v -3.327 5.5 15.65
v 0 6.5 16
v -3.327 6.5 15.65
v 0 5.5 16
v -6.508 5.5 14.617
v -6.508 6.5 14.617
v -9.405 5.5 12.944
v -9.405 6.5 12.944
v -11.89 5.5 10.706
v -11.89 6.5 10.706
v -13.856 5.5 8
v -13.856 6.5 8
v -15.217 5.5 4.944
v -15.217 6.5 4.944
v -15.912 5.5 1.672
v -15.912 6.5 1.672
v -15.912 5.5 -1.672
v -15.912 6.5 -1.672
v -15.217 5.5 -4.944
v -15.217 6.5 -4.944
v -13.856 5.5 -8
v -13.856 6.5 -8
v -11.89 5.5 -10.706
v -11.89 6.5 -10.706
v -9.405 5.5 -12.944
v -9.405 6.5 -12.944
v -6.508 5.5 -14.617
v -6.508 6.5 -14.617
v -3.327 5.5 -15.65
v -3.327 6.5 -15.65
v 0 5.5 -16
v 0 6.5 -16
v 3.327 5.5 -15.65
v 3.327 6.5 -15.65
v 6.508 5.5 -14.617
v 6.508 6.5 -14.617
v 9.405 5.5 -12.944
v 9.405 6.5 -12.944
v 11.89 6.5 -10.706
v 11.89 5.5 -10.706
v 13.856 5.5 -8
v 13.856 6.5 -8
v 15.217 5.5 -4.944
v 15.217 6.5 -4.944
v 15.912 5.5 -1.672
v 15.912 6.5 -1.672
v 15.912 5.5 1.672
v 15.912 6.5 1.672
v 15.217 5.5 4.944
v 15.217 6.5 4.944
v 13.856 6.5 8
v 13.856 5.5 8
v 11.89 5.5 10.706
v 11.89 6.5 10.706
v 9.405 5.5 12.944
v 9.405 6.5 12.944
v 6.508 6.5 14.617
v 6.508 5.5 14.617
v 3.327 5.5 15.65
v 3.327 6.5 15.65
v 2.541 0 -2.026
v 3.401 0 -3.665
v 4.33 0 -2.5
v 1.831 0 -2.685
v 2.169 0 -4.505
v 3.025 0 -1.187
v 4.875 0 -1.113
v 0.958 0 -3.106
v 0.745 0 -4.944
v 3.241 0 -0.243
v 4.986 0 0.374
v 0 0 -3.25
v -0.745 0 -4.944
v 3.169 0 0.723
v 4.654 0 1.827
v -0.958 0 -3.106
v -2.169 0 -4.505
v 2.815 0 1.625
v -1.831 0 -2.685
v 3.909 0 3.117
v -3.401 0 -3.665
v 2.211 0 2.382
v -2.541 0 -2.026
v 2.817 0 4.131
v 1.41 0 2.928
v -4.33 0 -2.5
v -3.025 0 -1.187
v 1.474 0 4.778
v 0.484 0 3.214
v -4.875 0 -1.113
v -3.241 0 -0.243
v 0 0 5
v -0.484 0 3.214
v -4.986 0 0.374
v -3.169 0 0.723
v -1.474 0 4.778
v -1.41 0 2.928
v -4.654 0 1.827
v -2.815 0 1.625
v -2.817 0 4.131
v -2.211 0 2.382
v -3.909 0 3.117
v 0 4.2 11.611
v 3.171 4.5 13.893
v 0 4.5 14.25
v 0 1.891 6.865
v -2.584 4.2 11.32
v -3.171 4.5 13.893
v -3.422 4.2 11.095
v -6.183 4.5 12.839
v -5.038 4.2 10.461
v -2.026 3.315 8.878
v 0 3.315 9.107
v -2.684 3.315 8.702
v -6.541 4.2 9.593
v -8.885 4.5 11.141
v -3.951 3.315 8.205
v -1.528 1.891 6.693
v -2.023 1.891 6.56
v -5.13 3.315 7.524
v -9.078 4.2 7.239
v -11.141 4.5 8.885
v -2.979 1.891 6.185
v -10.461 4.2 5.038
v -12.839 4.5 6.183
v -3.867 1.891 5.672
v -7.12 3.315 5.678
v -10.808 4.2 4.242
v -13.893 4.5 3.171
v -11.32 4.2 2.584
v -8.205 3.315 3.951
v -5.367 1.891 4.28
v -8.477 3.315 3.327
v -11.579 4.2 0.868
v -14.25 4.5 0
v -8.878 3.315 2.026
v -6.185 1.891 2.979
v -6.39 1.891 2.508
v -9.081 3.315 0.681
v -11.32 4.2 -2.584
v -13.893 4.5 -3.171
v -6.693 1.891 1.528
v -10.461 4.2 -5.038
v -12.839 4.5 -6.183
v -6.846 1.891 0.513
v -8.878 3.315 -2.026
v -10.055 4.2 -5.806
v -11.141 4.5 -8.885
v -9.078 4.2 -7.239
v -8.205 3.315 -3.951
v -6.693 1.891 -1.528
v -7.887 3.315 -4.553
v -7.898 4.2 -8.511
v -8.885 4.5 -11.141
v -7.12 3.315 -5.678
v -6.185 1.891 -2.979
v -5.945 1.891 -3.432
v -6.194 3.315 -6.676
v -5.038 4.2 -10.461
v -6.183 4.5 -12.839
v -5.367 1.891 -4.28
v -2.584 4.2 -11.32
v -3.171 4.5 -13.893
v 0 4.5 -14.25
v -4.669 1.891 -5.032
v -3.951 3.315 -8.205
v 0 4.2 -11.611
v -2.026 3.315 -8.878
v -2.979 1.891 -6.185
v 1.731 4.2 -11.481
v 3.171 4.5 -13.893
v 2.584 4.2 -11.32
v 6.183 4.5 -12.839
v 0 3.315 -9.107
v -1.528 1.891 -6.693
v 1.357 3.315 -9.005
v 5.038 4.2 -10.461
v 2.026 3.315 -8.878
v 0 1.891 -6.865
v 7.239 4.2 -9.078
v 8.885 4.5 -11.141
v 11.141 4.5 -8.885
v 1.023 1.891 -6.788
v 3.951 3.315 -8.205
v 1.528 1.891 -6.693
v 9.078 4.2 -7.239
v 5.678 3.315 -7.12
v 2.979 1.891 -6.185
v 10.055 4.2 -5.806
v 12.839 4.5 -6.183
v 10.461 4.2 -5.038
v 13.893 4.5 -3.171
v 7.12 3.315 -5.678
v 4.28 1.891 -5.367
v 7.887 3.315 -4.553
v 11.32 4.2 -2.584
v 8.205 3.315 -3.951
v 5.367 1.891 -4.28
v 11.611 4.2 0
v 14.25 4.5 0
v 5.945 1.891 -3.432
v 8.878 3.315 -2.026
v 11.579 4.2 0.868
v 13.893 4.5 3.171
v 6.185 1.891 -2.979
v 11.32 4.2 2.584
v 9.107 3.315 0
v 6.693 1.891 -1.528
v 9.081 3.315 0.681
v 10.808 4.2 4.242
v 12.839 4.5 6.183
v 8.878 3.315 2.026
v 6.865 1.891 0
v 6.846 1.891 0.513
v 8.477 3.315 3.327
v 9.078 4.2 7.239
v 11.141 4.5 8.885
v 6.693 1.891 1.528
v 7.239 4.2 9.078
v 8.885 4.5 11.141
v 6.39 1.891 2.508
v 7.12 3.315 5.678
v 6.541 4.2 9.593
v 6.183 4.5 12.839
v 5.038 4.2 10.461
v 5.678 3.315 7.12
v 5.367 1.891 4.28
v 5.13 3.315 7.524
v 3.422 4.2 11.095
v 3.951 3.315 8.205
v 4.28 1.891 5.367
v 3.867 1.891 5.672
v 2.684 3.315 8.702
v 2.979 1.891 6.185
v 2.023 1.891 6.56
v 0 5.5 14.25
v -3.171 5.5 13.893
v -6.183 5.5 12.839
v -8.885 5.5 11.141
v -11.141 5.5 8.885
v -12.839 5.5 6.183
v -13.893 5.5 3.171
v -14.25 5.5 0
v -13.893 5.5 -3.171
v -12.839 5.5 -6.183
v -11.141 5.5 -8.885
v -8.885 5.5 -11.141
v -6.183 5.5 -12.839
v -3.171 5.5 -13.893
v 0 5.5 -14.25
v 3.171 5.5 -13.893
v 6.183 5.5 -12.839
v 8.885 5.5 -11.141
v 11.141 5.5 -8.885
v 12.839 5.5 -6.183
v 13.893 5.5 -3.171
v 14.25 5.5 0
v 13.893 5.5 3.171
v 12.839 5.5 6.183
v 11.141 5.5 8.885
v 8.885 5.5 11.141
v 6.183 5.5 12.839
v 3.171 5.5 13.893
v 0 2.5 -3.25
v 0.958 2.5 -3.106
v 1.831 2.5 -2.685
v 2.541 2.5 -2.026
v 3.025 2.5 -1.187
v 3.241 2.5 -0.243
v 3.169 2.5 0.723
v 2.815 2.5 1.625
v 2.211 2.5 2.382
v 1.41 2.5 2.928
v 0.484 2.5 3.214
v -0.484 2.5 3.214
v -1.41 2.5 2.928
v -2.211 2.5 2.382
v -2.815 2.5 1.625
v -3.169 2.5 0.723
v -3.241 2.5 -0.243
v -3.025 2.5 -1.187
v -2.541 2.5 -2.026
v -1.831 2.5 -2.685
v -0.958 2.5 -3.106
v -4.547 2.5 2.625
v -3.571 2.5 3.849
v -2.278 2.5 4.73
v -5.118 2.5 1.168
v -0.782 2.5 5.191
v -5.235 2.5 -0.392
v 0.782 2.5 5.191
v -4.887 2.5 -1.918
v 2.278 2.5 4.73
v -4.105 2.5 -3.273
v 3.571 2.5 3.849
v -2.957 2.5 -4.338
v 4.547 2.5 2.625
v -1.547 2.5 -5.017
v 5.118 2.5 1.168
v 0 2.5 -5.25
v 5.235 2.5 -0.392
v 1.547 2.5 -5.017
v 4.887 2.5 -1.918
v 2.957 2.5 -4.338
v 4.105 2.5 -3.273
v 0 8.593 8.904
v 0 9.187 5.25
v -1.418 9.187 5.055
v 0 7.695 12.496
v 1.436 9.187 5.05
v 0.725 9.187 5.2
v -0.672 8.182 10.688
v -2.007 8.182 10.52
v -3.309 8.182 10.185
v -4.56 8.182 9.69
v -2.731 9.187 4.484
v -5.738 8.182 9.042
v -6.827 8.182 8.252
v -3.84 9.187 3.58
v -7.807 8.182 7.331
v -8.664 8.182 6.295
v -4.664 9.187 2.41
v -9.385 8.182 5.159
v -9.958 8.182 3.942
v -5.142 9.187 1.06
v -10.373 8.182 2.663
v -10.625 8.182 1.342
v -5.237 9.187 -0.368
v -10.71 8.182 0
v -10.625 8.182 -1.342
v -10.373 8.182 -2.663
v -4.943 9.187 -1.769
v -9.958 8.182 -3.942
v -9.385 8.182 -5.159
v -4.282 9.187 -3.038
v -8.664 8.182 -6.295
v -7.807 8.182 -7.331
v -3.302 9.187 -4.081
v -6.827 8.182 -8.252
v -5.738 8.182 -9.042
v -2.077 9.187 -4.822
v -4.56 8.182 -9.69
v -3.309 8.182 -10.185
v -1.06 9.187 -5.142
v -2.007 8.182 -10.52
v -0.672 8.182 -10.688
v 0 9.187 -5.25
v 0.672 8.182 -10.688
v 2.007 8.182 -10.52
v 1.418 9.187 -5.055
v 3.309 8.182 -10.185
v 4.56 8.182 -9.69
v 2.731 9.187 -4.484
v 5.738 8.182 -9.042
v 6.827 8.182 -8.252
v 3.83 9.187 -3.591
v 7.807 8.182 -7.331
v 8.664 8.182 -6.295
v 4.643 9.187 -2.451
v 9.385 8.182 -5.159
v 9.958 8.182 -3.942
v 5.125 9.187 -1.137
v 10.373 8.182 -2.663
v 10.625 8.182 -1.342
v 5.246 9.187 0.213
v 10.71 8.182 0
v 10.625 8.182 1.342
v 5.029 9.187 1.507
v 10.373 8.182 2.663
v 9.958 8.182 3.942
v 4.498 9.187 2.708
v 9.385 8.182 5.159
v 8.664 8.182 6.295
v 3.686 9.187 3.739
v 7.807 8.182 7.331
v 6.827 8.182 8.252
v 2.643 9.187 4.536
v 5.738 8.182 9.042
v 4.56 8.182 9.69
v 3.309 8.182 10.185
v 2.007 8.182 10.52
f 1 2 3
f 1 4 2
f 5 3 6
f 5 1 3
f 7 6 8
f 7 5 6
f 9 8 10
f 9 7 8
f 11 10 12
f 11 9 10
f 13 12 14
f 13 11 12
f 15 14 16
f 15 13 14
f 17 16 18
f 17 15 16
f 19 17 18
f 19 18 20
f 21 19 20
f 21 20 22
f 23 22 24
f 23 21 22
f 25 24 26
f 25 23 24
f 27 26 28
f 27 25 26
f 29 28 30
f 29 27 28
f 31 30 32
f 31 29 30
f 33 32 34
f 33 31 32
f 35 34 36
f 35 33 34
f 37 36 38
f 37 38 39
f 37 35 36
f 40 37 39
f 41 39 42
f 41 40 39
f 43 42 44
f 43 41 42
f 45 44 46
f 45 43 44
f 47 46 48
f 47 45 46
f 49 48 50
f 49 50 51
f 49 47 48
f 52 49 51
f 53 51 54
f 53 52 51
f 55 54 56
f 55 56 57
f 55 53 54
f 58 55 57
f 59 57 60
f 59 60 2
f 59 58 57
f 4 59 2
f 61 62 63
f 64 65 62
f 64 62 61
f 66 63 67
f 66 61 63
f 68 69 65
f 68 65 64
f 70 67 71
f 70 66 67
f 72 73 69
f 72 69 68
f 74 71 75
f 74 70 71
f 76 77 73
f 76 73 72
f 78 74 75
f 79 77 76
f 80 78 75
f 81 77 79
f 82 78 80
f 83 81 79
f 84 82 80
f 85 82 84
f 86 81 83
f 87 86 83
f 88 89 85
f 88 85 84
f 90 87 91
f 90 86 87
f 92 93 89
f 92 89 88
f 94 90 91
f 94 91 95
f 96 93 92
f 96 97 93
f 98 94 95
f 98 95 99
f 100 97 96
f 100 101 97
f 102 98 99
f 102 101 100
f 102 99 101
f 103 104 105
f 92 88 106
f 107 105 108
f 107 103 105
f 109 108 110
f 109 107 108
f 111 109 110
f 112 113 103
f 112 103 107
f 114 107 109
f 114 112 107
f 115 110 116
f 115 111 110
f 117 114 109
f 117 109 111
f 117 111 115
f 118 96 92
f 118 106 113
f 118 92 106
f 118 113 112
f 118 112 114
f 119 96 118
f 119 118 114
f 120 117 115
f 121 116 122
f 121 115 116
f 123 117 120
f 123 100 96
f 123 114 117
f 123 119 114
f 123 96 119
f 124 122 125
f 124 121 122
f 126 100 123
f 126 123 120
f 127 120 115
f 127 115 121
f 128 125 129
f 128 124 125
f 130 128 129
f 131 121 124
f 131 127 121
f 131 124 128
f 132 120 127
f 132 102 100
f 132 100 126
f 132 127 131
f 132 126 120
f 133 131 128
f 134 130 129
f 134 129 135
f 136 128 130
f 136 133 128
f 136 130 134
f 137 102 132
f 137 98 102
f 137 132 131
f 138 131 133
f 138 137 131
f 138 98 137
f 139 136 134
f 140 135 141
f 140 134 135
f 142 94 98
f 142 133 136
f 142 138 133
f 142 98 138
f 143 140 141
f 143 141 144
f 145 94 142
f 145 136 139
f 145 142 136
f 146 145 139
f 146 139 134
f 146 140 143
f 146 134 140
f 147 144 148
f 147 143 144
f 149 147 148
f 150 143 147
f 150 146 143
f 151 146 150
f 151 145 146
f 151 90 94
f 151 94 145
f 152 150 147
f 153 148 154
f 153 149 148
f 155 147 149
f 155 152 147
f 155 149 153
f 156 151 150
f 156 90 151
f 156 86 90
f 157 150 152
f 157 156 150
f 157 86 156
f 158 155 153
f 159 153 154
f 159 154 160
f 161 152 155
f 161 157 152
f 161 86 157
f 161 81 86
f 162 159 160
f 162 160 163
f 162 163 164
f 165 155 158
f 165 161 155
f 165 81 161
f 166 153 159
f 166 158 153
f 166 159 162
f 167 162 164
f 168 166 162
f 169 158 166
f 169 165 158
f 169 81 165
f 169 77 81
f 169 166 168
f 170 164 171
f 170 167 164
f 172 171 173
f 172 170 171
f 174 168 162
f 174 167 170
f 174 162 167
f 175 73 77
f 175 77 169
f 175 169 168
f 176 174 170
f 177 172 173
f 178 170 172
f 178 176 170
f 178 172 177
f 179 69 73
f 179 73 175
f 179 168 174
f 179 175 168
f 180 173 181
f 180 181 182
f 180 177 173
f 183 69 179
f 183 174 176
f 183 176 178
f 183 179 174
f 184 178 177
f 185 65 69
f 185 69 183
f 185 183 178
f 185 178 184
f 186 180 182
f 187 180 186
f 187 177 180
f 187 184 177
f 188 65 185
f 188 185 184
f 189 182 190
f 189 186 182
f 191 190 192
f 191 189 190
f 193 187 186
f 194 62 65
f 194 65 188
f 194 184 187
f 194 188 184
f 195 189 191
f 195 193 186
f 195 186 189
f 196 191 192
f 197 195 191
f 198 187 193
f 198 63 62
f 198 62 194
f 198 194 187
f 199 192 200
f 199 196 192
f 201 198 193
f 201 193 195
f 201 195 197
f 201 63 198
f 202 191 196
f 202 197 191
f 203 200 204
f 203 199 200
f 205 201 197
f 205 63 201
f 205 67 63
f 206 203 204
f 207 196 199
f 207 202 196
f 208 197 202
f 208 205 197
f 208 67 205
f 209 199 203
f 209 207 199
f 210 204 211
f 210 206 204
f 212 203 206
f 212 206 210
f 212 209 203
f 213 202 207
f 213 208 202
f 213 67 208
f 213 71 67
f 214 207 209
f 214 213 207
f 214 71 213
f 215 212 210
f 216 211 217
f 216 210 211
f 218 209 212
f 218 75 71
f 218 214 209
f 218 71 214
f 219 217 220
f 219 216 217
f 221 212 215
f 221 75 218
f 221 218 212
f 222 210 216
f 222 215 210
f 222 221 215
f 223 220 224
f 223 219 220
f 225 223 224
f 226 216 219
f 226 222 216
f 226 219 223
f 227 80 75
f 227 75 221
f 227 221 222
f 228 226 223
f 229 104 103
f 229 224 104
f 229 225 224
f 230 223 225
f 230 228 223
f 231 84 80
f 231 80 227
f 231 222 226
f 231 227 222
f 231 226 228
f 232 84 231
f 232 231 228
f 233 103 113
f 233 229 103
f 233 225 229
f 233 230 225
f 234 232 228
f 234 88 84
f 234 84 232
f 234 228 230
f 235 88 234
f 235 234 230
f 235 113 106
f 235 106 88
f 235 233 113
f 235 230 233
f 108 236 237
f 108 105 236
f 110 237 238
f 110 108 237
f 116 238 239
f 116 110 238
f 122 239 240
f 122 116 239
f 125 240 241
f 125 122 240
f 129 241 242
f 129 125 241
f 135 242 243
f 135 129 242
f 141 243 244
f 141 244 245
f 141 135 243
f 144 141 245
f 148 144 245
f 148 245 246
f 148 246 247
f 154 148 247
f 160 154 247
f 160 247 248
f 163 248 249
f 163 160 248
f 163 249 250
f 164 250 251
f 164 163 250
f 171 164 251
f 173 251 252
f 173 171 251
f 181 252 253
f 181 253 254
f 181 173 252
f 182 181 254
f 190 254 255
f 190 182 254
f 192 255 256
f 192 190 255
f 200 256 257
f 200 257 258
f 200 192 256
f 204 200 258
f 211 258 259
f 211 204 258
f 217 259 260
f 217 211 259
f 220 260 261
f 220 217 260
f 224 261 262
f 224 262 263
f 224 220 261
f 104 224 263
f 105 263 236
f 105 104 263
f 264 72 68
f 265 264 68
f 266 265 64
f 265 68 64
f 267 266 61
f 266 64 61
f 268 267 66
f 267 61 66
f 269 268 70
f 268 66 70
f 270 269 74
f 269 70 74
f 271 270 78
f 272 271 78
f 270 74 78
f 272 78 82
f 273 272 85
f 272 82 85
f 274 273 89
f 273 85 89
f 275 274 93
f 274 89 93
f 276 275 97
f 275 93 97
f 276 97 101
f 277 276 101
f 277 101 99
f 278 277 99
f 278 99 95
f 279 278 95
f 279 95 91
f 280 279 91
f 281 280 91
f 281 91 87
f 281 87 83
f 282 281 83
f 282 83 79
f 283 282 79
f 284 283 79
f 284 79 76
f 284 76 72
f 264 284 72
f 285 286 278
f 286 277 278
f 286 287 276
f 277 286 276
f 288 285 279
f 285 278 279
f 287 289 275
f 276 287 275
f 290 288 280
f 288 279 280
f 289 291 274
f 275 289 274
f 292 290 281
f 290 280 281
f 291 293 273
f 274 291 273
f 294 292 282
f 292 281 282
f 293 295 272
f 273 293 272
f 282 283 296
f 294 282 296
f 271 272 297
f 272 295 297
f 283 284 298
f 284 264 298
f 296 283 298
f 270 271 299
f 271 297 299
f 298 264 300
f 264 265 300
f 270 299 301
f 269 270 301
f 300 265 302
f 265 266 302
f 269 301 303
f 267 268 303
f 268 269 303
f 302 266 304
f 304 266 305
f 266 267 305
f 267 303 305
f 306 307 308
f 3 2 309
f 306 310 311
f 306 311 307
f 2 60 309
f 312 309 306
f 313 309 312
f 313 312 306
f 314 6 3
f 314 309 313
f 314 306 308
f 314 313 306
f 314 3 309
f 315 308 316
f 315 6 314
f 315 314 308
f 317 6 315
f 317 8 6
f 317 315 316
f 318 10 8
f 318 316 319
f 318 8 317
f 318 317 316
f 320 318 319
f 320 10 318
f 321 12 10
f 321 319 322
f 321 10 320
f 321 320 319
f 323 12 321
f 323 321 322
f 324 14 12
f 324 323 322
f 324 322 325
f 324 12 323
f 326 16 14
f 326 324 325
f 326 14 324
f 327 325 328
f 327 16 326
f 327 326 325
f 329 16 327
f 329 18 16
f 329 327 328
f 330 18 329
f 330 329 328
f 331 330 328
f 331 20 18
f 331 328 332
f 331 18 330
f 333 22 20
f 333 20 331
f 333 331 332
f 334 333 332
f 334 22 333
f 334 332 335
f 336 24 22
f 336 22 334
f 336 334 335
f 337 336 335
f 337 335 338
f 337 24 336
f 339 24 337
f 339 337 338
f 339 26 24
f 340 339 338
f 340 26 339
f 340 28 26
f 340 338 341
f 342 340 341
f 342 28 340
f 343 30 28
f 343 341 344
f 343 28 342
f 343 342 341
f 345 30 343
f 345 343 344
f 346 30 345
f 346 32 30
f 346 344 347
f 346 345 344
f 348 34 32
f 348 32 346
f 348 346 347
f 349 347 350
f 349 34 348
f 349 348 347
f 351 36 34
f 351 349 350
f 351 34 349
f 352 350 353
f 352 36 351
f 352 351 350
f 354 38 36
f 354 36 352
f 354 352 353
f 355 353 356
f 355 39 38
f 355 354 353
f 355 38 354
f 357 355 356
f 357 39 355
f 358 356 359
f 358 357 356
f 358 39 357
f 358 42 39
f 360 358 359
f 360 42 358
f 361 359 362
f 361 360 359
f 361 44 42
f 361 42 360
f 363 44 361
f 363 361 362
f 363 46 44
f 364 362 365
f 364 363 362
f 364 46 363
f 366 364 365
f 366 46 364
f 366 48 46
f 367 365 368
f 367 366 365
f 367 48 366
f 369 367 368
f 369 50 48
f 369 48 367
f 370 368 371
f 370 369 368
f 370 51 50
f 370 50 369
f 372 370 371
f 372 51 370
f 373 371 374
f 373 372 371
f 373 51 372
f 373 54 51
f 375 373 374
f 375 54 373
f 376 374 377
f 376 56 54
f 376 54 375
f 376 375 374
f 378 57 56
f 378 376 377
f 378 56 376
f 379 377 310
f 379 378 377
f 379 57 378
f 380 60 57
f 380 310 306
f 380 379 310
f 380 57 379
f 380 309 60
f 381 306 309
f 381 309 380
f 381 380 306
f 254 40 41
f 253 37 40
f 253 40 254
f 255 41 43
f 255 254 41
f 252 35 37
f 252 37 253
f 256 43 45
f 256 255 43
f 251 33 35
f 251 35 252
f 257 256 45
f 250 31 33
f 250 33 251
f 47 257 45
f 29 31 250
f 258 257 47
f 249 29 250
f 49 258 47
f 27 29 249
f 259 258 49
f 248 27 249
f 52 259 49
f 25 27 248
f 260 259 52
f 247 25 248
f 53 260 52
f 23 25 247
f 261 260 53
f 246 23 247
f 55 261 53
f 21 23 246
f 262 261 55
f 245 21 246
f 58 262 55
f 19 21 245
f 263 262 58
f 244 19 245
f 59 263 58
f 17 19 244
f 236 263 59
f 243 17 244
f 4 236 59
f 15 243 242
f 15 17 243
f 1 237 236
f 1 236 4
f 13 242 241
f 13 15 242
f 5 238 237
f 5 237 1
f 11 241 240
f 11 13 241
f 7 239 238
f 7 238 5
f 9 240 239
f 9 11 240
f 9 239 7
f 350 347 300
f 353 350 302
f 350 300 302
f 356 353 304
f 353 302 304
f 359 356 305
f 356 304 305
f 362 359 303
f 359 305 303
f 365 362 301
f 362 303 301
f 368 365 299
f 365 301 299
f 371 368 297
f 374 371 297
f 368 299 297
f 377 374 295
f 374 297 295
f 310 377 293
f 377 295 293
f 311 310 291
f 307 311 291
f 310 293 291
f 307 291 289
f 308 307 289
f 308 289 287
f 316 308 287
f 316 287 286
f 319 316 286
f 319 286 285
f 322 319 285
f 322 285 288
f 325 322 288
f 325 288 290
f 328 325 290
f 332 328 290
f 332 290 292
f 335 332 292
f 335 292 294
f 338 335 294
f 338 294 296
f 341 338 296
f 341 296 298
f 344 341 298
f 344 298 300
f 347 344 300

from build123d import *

# Parameters (mm, degrees)
ESQUISSE2_R             = 3.25
ENL_V_MAT_EXTRU_1_DEPTH = 10.5
ENL_V_START             = -2.5
ESQUISSE3_R             = 5.25
ENL_V_MAT_EXTRU_2_DEPTH = 7.880262221


with BuildPart() as part:
    # Esquisse1 → Révolution1 (revolve)
    with BuildSketch(Plane.XY, mode=Mode.PRIVATE) as r_volution1_sk:
        with BuildLine():
            Line((-16, 6.5), (-16, 5.5))
            Line((-16, 5.5), (-14.25, 5.5))
            Line((-14.25, 5.5), (-14.25, 4.5))
            ThreePointArc((-14.25, 4.5), (-9.106739847, 3.315312536), (-5, 0))
            Line((-5, 0), (0, 0))
            Line((0, 0), (0, 9.5))
            ThreePointArc((0, 9.5), (-8.139410298, 8.74352159), (-16, 6.5))
        make_face()
    revolve(r_volution1_sk.sketch.rotate(Axis((0, 18.461307074, 0), (0, -1, 0)), 270), axis=Axis((0, 18.461307074, 0), (0, -1, 0)))  # turned: the seam where the file's is

    # Esquisse2 → Enlèv. mat.-Extru.1 (cut, through all)
    with BuildSketch(Plane.XZ):
        with Locations(Location((0, 0, 0), (0, 0, 270))):  # turned: the seam where the file's is
            Circle(ESQUISSE2_R)
    extrude(amount=-ENL_V_MAT_EXTRU_1_DEPTH, mode=Mode.SUBTRACT)

    # Esquisse3 → Enlèv. mat.-Extru.2 (cut, through all)
    with BuildSketch(Plane.XZ.offset(ENL_V_START)):
        with Locations(Location((0, 0, 0), (0, 0, 270))):  # turned: the seam where the file's is
            Circle(ESQUISSE3_R)
    extrude(amount=-ENL_V_MAT_EXTRU_2_DEPTH, mode=Mode.SUBTRACT)


solid = part.part
